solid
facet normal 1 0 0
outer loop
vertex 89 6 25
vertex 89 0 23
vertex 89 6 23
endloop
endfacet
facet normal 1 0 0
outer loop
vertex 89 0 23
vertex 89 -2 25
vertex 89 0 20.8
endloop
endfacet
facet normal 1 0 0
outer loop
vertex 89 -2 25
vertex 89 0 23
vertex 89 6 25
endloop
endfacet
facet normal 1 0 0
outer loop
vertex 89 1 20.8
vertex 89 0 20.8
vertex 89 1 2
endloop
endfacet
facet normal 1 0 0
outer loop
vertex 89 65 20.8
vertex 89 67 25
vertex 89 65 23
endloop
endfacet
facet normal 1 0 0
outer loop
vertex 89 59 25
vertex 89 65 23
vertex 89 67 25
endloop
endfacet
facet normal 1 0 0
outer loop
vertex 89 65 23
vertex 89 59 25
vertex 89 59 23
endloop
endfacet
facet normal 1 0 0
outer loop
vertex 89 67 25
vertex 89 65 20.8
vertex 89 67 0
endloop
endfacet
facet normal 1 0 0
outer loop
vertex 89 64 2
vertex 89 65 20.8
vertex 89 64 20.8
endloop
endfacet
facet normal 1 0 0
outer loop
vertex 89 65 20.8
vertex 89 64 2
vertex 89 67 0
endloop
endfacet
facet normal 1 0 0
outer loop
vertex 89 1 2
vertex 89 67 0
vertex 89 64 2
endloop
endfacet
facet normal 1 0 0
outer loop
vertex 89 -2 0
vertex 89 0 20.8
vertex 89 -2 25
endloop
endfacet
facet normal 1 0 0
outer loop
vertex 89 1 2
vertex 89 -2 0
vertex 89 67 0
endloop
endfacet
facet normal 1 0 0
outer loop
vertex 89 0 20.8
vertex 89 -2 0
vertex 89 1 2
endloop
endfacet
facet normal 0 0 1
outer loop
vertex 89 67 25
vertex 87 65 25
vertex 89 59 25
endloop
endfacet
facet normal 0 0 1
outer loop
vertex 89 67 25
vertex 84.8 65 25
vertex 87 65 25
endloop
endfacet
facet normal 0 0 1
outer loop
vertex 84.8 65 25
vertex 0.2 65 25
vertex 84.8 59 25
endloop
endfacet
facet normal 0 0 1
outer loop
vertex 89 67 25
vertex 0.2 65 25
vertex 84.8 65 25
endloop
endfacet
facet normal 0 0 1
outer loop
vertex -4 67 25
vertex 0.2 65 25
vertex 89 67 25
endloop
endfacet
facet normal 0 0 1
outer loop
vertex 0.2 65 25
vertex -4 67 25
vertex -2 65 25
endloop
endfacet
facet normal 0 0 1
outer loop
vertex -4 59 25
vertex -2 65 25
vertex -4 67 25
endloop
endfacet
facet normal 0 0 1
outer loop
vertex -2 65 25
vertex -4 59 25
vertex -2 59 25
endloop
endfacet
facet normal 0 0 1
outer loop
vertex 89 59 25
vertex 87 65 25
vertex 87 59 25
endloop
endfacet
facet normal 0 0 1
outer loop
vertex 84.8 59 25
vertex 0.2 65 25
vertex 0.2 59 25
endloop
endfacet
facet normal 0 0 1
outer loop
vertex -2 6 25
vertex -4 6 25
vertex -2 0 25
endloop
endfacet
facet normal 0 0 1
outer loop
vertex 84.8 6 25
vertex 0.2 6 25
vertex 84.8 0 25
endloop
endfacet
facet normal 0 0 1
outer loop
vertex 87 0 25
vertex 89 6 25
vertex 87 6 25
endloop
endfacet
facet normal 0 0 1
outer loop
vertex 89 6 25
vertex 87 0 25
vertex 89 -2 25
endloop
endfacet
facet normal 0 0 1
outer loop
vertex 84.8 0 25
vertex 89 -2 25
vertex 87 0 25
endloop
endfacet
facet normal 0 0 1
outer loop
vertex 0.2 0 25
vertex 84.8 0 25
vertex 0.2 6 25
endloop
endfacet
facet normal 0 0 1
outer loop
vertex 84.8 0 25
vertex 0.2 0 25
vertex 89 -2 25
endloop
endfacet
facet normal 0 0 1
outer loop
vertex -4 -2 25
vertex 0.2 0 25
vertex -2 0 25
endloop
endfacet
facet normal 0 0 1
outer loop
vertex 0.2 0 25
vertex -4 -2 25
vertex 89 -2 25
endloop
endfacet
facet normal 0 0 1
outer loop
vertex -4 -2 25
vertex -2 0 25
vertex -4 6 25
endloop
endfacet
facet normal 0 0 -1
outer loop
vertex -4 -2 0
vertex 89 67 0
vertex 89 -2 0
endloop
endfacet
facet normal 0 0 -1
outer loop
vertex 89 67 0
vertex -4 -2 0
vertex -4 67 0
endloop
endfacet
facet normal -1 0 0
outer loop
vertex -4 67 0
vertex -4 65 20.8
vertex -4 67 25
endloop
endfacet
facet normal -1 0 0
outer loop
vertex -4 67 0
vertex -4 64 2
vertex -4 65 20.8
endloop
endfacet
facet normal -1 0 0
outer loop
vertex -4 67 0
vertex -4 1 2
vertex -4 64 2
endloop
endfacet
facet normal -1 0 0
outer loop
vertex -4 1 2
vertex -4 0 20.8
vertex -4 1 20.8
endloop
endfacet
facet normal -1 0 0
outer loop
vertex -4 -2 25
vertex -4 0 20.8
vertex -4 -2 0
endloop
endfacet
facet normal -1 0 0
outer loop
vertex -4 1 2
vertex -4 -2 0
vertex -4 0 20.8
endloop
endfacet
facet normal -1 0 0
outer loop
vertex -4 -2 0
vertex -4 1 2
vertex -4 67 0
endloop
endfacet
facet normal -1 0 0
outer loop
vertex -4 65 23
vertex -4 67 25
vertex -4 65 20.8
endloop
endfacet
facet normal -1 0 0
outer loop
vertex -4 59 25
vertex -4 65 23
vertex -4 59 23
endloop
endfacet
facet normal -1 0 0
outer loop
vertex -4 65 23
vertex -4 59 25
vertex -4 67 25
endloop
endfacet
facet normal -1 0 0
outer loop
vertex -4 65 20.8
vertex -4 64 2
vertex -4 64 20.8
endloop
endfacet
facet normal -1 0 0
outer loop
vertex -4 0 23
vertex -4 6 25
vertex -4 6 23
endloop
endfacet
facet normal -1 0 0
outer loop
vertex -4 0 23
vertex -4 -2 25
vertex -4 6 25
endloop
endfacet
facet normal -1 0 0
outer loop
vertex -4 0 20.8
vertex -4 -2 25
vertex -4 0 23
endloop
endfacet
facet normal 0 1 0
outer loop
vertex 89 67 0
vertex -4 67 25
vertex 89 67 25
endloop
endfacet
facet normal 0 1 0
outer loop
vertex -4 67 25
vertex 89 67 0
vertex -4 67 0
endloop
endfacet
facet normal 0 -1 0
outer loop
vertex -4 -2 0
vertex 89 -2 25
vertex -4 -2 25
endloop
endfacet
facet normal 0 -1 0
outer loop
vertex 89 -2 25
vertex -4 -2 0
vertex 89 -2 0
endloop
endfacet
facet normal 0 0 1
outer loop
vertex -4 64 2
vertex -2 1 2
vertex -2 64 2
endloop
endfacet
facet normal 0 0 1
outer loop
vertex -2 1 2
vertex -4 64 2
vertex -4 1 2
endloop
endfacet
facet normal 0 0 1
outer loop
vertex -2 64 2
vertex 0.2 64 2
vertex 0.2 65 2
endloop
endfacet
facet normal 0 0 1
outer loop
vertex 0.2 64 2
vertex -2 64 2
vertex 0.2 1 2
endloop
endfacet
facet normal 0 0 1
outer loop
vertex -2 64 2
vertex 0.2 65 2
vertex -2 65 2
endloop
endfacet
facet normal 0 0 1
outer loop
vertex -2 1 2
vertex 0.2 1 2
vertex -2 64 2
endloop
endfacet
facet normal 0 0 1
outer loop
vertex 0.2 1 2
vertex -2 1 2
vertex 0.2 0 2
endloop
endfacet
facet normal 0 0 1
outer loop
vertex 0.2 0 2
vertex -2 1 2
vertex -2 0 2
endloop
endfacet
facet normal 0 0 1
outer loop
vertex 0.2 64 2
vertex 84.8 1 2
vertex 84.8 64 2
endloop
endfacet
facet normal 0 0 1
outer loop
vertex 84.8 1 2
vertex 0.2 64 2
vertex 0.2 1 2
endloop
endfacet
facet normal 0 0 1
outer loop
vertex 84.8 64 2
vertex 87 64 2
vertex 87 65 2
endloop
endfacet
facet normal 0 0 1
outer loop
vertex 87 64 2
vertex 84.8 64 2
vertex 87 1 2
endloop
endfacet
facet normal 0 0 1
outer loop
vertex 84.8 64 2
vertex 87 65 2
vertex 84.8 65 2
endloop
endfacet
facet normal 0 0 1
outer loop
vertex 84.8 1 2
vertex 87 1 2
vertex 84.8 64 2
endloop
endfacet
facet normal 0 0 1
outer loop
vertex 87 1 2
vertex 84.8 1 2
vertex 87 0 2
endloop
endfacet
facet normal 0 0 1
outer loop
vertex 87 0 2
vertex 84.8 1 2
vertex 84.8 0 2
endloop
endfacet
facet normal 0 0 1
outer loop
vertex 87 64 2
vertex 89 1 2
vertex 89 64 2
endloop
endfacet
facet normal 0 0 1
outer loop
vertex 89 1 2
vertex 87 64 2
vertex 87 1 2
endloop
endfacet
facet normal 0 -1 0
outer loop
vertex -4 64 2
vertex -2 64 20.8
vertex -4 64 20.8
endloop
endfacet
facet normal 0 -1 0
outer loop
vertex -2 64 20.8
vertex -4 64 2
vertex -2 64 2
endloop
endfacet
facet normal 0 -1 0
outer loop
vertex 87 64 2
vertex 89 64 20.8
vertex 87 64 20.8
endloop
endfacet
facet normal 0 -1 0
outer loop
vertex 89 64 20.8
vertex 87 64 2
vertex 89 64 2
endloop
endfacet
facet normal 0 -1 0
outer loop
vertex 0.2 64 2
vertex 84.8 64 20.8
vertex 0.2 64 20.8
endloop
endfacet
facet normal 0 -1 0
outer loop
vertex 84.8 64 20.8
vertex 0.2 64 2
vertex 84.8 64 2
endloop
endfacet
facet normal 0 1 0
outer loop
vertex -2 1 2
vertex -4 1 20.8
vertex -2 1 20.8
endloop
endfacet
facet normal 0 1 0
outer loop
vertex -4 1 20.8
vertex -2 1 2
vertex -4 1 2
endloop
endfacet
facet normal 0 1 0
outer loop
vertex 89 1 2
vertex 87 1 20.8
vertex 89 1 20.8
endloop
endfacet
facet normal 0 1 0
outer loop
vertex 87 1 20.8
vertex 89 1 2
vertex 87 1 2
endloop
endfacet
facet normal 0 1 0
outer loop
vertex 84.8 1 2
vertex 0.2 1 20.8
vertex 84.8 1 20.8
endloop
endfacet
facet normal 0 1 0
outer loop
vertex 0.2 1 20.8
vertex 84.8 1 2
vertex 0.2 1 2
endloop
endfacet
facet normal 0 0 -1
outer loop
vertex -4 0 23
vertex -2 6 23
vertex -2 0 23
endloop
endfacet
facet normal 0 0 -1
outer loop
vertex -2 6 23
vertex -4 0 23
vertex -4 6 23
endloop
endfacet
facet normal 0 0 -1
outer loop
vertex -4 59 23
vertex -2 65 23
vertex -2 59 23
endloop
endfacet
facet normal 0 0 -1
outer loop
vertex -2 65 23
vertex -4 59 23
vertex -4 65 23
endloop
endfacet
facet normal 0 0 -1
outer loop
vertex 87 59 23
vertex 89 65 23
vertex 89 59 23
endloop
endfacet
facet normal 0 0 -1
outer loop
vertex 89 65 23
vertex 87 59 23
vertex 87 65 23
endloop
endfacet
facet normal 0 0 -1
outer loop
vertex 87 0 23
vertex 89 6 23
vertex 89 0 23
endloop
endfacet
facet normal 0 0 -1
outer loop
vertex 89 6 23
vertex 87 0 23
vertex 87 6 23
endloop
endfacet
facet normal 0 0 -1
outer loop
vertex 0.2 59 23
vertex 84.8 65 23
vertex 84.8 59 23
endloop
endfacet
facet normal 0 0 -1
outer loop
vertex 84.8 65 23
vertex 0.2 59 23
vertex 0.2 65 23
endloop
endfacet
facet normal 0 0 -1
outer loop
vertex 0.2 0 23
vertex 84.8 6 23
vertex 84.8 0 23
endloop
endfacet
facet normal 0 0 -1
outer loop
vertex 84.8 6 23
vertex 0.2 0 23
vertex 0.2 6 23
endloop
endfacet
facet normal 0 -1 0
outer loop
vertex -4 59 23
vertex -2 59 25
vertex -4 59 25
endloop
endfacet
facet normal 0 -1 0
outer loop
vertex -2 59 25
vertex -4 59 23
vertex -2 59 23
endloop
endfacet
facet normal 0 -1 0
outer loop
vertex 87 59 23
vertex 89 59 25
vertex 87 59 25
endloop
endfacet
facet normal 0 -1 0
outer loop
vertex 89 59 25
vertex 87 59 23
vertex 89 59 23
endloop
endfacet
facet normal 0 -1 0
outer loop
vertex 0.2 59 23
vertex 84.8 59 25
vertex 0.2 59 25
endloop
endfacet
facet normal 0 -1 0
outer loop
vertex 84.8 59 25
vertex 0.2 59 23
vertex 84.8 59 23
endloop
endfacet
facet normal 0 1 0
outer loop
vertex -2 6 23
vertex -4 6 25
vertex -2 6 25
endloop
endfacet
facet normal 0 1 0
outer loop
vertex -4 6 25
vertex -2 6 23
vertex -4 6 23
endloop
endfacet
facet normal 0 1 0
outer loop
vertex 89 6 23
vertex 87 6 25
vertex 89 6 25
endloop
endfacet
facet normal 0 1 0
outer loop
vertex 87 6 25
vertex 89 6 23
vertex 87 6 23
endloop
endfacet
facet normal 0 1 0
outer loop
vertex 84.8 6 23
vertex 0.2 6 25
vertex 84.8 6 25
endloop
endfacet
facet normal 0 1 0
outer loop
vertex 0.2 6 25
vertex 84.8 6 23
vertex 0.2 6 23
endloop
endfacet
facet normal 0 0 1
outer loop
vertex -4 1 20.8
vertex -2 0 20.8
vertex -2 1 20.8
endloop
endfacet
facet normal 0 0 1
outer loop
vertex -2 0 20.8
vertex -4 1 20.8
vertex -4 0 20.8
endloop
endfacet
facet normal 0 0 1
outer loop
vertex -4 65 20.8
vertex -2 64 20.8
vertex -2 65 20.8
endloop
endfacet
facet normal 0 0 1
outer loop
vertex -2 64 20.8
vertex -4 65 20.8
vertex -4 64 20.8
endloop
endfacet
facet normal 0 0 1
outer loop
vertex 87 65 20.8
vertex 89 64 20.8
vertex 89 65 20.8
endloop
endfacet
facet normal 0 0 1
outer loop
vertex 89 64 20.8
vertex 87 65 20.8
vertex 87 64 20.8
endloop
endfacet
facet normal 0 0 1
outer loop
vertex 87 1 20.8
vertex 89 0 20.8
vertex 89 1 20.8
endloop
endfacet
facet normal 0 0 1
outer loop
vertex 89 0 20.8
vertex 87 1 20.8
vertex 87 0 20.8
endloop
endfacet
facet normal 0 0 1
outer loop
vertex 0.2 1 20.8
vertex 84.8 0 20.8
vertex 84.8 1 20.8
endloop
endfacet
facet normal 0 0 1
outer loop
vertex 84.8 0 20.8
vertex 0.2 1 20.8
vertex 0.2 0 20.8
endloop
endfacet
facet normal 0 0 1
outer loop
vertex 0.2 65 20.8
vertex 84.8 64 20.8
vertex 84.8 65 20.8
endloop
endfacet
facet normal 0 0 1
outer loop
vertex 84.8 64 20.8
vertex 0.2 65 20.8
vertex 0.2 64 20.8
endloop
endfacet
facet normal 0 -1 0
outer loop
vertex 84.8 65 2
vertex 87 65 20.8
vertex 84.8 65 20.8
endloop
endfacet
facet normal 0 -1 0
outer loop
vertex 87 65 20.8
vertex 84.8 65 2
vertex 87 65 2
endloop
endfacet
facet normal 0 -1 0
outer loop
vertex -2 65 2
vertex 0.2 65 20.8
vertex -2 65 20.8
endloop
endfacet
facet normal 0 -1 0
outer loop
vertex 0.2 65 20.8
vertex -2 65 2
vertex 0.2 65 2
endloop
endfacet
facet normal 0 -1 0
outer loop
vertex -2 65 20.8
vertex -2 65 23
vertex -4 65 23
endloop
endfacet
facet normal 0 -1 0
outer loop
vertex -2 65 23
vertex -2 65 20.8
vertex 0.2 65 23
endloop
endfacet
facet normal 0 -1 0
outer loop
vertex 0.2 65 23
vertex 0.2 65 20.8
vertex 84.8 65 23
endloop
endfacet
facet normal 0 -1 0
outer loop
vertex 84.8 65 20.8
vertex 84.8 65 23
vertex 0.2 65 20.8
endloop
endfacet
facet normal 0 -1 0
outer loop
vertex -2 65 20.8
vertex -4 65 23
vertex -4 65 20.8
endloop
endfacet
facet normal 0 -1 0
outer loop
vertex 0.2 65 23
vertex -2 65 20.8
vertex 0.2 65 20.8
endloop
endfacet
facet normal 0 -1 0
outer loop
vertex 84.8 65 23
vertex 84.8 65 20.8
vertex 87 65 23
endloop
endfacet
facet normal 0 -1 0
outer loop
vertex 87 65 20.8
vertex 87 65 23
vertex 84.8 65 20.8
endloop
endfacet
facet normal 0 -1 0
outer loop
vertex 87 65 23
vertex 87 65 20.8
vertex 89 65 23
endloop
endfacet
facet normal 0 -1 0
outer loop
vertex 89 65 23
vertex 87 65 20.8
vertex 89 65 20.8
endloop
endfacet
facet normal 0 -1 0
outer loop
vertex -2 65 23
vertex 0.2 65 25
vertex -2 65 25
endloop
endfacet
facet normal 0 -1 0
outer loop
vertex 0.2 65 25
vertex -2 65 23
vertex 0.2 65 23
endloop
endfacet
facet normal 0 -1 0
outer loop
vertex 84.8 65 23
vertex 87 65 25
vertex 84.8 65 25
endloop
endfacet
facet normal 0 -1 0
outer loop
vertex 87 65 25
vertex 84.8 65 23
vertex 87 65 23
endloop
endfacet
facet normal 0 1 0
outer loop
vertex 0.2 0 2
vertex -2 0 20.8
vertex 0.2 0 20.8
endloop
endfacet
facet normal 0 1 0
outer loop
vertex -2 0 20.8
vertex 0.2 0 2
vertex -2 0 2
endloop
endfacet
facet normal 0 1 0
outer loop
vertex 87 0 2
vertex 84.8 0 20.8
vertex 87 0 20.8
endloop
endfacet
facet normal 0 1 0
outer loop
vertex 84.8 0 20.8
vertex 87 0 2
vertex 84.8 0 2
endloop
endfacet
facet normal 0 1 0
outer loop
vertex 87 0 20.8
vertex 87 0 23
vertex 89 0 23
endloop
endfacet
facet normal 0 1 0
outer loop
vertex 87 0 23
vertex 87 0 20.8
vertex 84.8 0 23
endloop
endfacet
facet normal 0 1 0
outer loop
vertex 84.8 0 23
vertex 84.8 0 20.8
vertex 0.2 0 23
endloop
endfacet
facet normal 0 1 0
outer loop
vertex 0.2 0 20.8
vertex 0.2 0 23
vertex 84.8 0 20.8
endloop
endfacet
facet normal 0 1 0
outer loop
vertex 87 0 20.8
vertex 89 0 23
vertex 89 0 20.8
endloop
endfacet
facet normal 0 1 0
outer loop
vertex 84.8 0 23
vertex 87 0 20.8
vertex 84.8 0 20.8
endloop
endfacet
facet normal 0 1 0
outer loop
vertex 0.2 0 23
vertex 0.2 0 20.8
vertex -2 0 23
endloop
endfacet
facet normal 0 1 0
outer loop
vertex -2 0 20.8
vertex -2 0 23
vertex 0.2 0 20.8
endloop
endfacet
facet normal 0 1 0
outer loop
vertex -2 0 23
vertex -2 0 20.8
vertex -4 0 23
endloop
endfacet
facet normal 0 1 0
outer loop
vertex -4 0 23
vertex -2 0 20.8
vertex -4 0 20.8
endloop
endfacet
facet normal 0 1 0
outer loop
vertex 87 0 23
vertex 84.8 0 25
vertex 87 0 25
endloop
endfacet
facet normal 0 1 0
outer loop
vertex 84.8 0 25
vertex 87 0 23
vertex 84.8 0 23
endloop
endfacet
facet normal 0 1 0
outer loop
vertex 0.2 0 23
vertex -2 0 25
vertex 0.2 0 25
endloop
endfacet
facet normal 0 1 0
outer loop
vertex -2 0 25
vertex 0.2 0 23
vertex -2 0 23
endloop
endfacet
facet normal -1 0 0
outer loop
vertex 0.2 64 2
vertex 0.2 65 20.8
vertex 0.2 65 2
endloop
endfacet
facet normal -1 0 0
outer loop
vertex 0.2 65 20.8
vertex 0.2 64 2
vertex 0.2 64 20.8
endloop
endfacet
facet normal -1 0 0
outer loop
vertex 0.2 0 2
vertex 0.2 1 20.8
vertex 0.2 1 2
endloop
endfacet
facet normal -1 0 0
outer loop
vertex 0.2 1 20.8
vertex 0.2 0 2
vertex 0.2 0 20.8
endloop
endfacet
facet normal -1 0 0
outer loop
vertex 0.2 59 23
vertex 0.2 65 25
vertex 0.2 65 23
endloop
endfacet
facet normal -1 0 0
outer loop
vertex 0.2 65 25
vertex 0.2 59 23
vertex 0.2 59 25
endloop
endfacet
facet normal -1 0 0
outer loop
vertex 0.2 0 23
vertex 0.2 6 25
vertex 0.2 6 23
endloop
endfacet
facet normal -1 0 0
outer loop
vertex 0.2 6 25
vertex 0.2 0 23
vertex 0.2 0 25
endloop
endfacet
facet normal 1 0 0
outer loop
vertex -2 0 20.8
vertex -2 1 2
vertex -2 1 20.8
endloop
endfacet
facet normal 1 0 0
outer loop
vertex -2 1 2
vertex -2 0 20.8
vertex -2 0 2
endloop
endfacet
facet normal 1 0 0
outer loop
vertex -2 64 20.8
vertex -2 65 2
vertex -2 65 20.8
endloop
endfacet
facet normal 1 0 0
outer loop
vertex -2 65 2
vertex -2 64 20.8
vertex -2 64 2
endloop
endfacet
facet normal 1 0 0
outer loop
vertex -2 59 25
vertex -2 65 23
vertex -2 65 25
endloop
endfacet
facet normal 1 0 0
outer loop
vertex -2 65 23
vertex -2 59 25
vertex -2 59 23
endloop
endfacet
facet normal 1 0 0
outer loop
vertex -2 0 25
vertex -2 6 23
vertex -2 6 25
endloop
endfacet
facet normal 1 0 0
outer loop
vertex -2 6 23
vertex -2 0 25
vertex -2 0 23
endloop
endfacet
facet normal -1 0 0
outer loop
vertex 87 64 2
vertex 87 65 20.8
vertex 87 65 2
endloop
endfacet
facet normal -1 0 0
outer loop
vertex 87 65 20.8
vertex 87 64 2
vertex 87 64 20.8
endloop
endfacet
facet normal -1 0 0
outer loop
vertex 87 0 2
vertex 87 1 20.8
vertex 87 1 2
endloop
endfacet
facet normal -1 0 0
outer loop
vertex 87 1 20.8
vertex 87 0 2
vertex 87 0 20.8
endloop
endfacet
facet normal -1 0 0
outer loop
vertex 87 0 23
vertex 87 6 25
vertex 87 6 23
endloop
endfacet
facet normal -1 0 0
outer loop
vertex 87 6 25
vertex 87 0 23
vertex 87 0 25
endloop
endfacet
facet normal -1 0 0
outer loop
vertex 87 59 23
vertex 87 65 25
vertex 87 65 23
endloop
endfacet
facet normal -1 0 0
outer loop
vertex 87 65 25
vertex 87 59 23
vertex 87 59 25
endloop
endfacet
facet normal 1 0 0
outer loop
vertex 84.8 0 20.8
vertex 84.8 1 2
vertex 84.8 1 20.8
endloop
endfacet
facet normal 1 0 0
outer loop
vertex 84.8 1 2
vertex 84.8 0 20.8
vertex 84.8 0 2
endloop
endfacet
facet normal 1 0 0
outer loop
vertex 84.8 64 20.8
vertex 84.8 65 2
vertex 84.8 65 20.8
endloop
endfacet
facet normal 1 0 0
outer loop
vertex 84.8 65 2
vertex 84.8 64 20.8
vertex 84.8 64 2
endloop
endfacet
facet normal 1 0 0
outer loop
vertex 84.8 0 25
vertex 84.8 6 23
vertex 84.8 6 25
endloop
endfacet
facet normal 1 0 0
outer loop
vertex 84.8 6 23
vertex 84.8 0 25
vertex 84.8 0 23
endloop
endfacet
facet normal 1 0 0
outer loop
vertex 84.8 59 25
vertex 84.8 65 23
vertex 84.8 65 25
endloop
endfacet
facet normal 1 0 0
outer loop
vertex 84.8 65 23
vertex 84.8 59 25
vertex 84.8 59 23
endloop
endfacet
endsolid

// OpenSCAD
$fn = 20;
x = 85;
y = 65;
z = 25;
t = 2;

lcd_x = ceil(71.53);
lcd_y = ceil(24.22);
led_x = 5+0.75;
btn_x = ceil(6.38);
usb_y = 11.;
usb_z = 8.5;

main();
/*
color("red")
translate([0,0,z-t*2])
top();

color("blue")
translate([-t,0,t])
wall();

color("blue")
translate([x,-t/6,t])
power();
*/


module top() {
    difference() {
        b = 0.2;
        cube([x-b,y,t-b*2]);
        
        translate([7,10,0])
        cube([lcd_x,lcd_y,t]);
        
        translate([12,50,0])
        cylinder(h=t, d=btn_x);
        
        translate([35,50,0])
        cylinder(h=t, d=led_x);
        
        translate([76,50,0])
        cylinder(h=t, d=led_x);
    }
    w = ceil(2.78);
    translate([7+lcd_x,10,0-w])
    cube([t,lcd_y,w]);
}

module main() {
    b = 0.2;
    difference() {

        box();
        
        translate([-x/2,0,z-t*2-b])
        cube([x*2,y,t+b]);
        
        translate([-t,0,t])
        cube([t+b,y,z]);
        
        translate([x-b,0,t])
        cube([t+b,y,z]);
    }
    /*
    translate([x-b,t*2,z-t])
    cube([t+b,t,t]);
    translate([x-b,y-t*3,z-t])
    cube([t+b,t,t]);
    translate([-t,t*2,z-t])
    cube([t+b,t,t]);
    translate([-t,y-t*3,z-t])
    cube([t+b,t,t]);
    */
}

module box() {
    difference() {
        b = 0.2;
        translate([-t*2,-t,0])
        cube([x+t*4,y+t*2,z]);
        
        translate([-x/2,t/2,t])
        cube([x*2,y-t,z]);
    }
    
    translate([0,0,z-t])
    difference() {
        translate([-t*2,0,0])
        cube([x+t*4,y,t]);
        
        translate([-t*2,(y-(y-t*6))/2,0])
        cube([x*2,y-t*6,t]);
    }
}

module wall() {
    cube([t-0.2,y-0.2,z-t]);
}

module power() {
    difference() {
        wall();
        
        translate([0,y/2-usb_y/2,t*2])
        cube([t,usb_y,usb_z]);
    }
}
